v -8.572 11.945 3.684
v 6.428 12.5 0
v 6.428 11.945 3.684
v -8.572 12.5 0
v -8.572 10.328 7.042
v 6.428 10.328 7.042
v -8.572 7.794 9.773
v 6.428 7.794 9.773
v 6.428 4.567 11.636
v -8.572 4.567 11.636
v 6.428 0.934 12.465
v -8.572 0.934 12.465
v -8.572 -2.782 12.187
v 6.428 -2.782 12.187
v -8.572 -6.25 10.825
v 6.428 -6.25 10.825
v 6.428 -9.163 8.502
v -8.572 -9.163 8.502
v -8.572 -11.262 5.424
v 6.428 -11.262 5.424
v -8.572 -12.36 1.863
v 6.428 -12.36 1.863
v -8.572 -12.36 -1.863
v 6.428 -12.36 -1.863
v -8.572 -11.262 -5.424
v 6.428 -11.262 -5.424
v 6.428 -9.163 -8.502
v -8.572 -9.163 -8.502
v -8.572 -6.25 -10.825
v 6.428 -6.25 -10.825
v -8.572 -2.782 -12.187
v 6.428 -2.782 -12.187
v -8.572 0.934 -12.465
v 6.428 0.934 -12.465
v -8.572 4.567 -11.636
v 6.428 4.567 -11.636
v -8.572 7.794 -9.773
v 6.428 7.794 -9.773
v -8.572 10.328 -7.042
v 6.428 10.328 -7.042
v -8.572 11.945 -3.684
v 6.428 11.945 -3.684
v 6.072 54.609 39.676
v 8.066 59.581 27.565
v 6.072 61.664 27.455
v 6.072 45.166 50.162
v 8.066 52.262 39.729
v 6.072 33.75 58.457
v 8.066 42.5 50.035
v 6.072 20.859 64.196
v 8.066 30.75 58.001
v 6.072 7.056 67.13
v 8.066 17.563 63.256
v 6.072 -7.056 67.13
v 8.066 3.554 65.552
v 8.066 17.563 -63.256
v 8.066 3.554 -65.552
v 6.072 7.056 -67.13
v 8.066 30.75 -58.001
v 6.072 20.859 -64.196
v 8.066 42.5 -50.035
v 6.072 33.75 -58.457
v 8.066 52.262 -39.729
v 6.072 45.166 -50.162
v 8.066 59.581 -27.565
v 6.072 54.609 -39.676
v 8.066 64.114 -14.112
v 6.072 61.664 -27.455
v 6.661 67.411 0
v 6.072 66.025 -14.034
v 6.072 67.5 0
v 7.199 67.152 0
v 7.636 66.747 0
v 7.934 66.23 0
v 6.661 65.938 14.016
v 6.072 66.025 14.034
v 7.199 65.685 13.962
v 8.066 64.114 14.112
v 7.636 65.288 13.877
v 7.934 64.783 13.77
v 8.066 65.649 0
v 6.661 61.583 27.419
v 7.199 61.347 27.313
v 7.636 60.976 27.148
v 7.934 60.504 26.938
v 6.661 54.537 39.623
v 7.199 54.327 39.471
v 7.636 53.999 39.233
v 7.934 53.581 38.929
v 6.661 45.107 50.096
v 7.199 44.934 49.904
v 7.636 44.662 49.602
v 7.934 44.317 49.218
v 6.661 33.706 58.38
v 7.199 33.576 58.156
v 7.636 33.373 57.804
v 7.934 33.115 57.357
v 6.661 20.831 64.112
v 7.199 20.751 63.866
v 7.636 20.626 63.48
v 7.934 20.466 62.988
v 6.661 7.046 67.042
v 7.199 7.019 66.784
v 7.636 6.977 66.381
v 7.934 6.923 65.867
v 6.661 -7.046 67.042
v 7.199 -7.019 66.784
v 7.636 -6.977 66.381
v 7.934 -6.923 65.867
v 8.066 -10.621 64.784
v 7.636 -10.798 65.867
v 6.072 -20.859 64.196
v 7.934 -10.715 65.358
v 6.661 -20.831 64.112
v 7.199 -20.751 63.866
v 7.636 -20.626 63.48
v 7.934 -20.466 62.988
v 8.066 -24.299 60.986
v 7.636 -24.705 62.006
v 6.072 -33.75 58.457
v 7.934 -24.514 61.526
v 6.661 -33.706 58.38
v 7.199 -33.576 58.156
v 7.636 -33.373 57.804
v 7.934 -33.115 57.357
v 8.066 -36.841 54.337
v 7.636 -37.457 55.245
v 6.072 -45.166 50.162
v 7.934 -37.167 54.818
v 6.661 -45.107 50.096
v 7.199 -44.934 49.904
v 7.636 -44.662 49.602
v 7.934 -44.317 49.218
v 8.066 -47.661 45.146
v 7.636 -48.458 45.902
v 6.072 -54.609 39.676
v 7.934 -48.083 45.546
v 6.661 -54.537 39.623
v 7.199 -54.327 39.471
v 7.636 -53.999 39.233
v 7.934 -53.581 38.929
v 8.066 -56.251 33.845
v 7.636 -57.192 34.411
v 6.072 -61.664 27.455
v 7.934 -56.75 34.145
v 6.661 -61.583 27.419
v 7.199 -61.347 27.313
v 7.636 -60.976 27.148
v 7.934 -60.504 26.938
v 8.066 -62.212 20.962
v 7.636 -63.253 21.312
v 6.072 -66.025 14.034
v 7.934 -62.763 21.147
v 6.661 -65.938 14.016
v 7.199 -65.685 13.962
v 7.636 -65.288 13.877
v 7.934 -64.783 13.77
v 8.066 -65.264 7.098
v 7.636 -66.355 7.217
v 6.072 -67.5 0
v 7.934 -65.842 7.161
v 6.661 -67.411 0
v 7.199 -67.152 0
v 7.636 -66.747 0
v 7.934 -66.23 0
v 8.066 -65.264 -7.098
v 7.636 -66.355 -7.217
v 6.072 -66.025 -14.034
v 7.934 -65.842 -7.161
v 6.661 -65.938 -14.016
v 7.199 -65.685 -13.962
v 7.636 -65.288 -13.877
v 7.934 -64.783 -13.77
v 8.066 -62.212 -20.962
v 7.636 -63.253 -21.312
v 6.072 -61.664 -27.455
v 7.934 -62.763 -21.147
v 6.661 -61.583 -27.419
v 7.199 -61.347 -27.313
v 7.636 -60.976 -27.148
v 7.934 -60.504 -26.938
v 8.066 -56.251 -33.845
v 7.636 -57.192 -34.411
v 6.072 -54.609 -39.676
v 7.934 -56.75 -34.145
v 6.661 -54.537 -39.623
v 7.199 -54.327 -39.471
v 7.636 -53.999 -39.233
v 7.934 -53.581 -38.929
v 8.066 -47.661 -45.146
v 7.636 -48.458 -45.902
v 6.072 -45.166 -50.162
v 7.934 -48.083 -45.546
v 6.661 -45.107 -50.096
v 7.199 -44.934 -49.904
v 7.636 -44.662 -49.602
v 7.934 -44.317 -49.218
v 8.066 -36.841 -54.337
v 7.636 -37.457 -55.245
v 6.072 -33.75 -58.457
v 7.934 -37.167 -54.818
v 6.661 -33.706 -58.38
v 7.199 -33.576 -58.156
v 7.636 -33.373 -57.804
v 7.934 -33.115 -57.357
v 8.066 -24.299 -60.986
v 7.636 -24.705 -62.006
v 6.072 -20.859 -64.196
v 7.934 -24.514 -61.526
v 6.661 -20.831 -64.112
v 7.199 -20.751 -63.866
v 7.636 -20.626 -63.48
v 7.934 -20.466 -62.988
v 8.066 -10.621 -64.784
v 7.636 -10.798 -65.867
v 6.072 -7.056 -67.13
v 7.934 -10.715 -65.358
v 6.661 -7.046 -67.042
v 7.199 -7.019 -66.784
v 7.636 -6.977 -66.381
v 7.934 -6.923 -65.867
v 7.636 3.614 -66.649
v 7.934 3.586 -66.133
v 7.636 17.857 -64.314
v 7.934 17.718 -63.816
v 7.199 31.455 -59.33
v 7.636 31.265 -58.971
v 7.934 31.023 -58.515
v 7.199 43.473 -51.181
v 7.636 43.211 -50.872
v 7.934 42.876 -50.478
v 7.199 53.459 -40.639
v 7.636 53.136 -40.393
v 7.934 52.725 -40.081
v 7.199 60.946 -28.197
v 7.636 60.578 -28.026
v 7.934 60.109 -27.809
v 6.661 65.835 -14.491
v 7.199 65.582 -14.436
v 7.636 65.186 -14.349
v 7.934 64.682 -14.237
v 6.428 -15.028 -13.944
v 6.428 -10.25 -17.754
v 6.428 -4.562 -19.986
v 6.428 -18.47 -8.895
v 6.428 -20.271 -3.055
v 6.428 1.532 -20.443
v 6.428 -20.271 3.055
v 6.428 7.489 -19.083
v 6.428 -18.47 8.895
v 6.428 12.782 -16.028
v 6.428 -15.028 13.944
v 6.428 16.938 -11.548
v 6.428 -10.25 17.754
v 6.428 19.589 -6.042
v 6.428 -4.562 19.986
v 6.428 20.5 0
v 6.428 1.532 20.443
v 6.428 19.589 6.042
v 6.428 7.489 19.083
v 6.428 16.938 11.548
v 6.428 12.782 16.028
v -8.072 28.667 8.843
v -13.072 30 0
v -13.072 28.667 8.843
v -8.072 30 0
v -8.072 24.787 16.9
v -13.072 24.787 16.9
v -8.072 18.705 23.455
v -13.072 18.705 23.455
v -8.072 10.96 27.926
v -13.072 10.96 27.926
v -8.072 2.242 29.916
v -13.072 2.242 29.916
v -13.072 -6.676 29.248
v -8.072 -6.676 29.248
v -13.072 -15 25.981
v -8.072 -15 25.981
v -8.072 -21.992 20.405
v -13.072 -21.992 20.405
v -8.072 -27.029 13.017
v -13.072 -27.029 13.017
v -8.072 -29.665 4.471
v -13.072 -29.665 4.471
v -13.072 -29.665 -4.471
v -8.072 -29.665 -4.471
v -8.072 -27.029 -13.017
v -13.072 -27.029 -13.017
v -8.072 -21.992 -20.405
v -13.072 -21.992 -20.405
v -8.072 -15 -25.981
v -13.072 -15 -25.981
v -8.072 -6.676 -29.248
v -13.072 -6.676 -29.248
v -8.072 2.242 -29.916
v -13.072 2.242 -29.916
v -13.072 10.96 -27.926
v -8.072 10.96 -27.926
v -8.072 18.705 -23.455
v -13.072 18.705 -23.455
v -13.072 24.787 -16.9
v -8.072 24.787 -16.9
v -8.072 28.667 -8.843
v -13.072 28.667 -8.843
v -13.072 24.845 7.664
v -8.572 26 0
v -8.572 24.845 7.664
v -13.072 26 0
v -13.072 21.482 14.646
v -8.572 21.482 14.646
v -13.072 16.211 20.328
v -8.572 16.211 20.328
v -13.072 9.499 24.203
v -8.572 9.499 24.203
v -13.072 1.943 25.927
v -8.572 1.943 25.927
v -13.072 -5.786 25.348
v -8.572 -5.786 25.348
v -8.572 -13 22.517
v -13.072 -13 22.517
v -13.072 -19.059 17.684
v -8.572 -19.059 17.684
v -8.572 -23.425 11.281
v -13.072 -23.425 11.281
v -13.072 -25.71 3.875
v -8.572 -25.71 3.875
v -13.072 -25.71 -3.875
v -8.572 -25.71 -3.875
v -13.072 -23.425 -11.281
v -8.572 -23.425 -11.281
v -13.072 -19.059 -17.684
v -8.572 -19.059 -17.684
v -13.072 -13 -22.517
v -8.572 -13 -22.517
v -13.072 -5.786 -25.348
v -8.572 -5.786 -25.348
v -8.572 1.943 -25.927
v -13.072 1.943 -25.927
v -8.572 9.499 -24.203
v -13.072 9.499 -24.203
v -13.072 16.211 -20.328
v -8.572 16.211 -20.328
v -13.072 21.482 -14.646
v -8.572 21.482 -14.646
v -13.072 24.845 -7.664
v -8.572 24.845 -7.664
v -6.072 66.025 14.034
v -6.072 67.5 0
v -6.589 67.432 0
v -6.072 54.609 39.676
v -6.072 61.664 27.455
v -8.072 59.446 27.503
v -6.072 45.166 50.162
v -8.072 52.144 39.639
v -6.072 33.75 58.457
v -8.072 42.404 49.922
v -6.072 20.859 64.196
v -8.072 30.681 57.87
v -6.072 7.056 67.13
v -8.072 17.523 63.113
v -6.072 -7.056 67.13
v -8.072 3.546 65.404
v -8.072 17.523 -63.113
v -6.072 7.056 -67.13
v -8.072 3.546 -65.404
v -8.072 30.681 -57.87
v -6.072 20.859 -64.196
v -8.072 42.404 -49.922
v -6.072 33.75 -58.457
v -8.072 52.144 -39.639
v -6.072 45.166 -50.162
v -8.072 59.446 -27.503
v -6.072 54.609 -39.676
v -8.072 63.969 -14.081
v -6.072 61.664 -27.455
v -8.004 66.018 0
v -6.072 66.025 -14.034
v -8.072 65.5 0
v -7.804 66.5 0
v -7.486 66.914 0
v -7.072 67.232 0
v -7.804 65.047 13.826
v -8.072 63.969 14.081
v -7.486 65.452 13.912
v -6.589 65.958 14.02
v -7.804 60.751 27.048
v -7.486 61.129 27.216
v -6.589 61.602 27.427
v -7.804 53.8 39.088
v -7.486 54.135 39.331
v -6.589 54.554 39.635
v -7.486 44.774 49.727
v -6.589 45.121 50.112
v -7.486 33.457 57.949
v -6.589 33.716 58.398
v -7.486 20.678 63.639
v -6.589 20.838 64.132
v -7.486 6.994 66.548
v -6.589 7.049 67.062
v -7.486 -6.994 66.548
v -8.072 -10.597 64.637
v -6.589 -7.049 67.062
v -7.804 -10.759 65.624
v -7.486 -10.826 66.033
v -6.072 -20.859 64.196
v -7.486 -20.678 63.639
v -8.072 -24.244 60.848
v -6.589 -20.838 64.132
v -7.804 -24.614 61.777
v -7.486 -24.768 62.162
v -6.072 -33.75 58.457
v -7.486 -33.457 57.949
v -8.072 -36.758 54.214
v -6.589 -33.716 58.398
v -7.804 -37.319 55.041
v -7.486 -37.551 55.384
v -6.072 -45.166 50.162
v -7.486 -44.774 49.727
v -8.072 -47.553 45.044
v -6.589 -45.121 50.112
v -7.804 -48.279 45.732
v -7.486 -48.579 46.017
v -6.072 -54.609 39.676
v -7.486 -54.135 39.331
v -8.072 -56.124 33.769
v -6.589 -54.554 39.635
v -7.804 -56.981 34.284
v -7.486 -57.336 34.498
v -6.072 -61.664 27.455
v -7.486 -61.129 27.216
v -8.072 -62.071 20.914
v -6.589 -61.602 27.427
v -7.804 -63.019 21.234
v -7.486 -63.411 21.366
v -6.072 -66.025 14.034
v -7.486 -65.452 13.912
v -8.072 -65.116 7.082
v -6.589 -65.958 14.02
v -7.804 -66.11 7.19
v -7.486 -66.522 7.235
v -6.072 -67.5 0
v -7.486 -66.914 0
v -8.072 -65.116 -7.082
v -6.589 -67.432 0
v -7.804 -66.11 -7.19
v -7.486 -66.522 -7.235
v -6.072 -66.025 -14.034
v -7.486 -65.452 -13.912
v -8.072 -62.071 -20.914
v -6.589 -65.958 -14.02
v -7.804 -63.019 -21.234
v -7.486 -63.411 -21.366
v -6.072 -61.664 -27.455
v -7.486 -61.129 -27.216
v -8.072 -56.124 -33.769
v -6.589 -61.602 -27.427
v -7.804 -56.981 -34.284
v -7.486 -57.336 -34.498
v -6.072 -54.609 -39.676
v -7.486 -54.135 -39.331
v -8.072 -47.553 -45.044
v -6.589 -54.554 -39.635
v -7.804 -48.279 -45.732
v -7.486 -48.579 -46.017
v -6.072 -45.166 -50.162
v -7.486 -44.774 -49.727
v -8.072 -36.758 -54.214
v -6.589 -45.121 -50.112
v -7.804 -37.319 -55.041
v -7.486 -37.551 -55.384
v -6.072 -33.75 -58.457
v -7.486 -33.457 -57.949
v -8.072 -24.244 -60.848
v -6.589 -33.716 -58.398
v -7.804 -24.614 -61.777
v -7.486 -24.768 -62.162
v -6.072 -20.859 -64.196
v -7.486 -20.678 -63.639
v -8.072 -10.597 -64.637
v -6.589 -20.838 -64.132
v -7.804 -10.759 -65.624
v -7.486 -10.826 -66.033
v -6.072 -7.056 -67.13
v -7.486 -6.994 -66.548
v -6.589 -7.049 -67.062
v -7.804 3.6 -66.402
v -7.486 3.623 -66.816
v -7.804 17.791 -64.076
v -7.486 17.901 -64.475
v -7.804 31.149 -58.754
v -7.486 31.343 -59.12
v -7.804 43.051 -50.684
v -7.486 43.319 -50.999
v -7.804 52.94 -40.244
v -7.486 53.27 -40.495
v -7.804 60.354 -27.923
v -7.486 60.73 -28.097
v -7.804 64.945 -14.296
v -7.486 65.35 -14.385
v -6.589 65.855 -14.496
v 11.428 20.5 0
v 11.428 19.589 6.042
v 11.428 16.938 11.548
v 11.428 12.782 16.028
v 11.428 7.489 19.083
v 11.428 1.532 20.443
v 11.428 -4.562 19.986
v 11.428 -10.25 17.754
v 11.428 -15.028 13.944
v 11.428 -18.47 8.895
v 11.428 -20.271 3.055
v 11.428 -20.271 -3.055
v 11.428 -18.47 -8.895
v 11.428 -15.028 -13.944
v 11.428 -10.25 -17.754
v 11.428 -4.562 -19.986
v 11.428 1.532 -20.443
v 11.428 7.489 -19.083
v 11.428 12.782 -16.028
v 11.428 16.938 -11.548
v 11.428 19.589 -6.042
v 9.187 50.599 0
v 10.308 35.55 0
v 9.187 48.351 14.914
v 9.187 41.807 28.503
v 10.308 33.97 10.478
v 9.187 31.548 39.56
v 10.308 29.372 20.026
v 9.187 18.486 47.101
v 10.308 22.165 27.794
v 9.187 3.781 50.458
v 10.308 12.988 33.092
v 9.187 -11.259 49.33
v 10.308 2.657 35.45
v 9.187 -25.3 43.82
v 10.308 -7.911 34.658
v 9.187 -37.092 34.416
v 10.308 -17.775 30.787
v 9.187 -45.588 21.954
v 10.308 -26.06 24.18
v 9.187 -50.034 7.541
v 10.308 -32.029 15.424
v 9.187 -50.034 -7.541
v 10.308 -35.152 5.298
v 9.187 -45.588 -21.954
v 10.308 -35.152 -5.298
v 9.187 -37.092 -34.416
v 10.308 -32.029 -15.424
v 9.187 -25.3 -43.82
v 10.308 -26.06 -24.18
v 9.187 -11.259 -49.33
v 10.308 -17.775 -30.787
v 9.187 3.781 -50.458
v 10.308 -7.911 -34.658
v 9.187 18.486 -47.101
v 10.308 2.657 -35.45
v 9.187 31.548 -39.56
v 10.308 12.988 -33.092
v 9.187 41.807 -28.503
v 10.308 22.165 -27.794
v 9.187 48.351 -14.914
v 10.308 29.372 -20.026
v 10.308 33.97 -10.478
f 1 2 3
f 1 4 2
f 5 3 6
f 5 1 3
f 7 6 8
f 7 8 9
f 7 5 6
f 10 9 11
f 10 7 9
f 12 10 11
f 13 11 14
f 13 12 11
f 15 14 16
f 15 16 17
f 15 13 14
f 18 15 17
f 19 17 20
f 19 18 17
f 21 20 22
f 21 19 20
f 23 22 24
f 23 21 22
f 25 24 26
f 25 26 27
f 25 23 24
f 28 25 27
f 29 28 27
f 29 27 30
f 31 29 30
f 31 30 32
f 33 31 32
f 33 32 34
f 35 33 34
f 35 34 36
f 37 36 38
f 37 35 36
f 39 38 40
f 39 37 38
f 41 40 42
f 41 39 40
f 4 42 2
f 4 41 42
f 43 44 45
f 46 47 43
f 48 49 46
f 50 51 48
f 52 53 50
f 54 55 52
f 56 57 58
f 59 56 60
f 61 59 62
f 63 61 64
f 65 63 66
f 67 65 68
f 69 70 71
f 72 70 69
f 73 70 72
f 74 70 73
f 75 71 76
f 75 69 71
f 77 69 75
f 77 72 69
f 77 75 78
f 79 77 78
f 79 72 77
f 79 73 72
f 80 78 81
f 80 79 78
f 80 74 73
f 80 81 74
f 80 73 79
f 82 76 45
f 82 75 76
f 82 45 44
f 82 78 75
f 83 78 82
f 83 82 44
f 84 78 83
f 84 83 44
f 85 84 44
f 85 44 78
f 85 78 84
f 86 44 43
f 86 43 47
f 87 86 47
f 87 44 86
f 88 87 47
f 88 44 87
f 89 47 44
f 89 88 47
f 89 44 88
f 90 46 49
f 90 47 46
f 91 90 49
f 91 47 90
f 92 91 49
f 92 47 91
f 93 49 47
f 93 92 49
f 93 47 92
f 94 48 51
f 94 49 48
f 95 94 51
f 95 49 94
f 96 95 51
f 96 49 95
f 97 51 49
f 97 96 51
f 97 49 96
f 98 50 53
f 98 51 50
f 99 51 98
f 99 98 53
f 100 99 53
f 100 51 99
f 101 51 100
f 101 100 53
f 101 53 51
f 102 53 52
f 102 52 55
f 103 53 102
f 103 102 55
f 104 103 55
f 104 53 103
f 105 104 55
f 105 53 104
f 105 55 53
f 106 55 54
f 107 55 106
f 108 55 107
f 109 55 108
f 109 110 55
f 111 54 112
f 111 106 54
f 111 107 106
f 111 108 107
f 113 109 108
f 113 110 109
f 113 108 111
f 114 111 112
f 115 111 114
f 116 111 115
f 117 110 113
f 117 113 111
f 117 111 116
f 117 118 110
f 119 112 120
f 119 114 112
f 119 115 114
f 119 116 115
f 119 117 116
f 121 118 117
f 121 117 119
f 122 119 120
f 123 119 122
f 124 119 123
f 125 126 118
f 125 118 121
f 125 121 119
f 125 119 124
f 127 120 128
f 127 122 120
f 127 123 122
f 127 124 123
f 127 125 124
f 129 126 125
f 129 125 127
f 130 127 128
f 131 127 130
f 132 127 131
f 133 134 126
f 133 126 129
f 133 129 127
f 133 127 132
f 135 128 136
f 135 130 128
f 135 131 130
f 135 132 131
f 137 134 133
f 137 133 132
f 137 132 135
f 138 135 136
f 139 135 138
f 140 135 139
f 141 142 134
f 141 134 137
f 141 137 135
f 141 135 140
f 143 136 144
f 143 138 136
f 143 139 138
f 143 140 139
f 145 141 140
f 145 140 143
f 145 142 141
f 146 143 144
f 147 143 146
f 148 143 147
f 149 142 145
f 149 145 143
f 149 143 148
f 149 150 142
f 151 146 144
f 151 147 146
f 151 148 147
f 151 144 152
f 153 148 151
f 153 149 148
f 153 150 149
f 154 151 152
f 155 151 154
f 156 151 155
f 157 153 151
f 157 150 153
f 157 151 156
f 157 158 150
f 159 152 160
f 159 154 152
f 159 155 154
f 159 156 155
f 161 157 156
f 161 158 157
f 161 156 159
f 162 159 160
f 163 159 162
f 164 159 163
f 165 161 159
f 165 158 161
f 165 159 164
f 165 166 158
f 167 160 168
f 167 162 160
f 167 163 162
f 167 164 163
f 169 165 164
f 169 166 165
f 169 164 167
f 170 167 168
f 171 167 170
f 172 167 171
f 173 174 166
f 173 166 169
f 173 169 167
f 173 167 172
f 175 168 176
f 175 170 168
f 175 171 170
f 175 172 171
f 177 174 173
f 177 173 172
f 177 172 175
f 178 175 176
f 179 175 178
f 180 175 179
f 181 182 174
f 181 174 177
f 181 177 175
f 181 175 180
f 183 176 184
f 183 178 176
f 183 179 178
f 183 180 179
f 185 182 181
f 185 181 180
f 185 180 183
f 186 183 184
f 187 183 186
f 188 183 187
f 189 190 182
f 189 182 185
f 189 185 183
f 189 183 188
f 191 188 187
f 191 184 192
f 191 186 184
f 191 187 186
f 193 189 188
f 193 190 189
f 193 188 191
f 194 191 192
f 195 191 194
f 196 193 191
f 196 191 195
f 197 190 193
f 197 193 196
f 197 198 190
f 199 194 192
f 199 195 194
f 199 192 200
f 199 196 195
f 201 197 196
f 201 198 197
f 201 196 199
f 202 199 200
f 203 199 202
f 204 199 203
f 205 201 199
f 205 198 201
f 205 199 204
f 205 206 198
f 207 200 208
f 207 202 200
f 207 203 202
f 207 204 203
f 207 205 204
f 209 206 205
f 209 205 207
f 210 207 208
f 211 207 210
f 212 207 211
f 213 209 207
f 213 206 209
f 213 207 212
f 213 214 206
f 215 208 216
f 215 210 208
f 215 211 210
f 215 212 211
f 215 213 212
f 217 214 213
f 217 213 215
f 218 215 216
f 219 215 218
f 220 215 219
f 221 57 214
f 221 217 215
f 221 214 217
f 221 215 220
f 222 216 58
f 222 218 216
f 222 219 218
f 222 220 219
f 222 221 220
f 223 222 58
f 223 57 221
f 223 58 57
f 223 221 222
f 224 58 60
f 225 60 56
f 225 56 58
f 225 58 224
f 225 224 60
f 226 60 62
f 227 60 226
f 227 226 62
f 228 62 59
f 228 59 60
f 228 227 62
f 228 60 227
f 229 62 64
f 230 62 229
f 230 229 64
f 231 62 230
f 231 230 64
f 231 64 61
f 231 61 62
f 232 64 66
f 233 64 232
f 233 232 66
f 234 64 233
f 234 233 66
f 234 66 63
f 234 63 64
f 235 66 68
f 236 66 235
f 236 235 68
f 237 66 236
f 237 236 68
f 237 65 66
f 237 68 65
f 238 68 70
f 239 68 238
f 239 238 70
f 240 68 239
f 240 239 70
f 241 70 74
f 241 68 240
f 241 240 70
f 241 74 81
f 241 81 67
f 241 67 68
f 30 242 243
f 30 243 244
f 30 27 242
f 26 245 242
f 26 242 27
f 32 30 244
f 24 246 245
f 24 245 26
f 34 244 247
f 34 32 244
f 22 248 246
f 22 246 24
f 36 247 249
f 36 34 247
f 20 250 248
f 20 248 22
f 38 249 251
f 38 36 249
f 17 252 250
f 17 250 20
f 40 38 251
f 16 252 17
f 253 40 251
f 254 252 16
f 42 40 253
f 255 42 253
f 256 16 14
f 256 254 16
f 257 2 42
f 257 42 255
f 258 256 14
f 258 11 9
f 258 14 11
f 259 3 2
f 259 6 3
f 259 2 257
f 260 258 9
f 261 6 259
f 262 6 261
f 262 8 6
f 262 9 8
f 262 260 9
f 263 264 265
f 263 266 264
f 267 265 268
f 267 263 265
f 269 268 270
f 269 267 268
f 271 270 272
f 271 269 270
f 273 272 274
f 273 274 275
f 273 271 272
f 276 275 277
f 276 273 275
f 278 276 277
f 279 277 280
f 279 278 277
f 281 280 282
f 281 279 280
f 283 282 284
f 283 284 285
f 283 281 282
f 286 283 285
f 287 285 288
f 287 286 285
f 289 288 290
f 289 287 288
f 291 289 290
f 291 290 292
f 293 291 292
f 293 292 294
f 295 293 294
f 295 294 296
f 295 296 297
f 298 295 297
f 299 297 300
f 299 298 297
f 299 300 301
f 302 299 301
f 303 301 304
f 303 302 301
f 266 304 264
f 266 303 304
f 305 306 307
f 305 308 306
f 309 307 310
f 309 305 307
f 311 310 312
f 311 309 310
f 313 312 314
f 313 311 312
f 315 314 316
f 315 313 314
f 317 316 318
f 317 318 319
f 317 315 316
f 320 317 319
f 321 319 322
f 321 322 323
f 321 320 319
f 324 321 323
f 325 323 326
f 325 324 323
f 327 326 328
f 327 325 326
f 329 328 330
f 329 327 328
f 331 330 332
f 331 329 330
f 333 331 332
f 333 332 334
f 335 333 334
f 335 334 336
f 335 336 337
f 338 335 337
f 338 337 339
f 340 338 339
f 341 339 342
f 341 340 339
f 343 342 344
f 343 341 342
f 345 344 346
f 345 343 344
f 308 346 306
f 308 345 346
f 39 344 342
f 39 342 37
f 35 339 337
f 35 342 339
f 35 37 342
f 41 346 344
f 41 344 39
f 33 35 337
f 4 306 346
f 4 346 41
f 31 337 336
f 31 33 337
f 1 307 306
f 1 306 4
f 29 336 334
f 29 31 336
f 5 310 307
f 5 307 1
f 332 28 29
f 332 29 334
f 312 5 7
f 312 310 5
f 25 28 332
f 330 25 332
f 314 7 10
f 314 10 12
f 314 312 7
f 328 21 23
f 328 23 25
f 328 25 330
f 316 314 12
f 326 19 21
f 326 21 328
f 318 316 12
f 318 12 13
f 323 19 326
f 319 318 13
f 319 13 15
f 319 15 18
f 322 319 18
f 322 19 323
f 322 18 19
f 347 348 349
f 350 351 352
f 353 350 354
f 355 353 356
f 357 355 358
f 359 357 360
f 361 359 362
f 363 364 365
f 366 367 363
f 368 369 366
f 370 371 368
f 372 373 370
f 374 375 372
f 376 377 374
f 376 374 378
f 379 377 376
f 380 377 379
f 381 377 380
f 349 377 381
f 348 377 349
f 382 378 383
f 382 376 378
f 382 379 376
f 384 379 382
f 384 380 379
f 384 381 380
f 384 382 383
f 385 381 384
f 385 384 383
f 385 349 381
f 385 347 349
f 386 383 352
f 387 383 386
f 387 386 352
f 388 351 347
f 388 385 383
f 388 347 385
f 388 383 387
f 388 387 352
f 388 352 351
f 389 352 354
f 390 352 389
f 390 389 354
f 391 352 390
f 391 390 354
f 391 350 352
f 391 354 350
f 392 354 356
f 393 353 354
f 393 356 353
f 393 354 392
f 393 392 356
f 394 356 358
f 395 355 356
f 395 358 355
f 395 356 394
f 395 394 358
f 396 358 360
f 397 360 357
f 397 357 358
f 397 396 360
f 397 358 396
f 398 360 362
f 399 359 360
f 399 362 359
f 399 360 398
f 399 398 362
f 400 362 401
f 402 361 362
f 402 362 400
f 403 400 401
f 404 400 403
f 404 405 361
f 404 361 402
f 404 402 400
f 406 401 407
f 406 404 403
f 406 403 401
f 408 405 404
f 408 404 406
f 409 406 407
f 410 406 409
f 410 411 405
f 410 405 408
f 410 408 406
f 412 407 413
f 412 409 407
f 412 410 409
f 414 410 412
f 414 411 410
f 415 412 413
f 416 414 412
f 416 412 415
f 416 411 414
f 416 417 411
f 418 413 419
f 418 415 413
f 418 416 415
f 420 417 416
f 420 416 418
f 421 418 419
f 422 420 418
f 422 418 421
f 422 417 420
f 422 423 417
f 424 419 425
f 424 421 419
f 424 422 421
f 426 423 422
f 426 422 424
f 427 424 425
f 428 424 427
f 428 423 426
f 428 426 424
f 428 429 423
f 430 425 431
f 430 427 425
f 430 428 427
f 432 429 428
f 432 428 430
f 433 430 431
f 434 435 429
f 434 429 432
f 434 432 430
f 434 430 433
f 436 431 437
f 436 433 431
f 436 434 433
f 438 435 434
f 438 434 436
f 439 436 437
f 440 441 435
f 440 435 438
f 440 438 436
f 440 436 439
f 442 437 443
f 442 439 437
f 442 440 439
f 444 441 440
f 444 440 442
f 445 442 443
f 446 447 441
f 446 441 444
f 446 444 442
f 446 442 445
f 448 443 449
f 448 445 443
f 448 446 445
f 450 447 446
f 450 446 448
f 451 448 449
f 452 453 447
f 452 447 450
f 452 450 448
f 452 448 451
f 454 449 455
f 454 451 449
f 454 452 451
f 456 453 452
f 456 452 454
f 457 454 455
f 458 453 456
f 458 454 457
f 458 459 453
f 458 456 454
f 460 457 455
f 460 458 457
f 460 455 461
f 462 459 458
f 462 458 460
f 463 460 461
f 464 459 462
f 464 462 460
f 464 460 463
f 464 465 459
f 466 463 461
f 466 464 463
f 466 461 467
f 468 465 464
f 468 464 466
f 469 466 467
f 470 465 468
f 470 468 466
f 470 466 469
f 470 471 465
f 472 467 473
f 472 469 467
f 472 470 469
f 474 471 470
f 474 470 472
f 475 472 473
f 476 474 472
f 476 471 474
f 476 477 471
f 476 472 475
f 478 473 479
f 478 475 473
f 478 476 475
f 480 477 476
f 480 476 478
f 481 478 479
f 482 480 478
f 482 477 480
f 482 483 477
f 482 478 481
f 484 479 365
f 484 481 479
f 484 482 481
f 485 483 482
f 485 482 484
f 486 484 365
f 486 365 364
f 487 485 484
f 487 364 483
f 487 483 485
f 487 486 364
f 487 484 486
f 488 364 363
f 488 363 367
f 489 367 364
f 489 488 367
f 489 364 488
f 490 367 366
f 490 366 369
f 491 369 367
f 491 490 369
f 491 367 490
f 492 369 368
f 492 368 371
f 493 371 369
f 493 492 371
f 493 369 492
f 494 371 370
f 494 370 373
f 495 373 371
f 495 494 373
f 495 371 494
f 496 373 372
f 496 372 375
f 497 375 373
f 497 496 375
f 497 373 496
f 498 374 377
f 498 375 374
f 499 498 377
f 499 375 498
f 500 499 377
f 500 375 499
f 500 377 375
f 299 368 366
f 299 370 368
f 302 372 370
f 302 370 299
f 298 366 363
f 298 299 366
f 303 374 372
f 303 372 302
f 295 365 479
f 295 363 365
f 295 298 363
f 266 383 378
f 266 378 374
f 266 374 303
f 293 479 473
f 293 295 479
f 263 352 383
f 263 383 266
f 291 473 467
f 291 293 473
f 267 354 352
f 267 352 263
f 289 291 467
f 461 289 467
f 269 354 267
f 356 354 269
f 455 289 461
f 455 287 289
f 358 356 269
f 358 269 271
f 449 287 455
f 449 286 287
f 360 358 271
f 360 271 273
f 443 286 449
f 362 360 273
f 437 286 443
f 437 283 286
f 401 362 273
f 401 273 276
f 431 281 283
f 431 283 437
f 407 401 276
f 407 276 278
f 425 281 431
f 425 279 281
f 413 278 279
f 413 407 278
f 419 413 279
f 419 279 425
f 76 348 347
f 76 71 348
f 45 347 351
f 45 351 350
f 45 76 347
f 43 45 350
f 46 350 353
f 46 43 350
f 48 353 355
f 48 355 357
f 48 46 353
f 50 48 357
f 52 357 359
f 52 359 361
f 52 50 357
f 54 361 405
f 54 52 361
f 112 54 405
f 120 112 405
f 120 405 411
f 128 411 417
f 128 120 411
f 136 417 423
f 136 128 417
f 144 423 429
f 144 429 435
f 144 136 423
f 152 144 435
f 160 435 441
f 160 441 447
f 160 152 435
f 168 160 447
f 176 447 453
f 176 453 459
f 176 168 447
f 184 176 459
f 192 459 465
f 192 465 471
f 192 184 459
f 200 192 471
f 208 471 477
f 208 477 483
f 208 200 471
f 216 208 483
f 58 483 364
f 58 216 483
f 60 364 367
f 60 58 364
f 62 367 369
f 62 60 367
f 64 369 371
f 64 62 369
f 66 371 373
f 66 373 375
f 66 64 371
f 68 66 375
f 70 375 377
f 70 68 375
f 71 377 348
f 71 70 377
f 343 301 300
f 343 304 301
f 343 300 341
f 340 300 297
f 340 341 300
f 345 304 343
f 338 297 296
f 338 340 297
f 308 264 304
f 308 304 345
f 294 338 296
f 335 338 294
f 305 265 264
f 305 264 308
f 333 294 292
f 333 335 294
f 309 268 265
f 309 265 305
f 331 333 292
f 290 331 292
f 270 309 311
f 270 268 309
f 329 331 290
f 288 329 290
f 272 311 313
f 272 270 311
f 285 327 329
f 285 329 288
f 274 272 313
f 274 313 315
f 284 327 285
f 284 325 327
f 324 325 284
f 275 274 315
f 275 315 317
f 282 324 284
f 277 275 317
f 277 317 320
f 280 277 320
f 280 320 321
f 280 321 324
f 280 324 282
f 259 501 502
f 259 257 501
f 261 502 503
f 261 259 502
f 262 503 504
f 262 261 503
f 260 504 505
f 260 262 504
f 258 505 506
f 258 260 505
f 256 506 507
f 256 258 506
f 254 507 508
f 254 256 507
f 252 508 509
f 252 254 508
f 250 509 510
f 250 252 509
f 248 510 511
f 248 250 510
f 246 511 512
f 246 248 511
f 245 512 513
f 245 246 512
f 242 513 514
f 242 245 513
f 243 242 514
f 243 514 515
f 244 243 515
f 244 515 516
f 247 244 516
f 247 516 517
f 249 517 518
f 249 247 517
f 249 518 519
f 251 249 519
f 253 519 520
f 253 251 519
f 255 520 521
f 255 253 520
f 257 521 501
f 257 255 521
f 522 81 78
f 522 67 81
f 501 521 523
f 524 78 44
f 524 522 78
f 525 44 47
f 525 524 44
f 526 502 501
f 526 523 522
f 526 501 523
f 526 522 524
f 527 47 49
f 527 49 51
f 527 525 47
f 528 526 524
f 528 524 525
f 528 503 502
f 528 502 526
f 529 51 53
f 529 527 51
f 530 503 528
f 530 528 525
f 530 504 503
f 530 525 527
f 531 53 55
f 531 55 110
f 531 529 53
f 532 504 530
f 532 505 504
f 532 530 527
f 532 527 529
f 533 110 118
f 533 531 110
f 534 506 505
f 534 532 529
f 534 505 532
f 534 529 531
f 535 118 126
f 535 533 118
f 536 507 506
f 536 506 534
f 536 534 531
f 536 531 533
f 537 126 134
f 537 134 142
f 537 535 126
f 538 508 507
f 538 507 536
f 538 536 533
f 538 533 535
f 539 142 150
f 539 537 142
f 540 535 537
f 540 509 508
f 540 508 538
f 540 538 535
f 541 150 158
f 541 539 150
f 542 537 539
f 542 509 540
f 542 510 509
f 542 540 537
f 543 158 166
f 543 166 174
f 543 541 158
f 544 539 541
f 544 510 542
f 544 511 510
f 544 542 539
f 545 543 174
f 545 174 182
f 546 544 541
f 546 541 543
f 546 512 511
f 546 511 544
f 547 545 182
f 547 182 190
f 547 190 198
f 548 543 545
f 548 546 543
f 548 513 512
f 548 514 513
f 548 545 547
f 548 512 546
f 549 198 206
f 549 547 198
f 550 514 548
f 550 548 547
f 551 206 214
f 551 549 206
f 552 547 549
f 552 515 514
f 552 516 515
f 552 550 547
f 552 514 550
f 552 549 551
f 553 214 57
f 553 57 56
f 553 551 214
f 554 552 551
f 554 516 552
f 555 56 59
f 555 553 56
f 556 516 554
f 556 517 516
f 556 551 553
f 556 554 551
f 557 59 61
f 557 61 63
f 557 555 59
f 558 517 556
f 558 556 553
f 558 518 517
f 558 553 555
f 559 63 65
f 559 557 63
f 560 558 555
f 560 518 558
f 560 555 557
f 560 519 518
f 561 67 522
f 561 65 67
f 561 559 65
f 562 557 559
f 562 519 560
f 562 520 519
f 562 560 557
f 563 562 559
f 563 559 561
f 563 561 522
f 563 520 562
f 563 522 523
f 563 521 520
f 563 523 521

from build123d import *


with BuildPart() as part:
    # Эскиз1 → Повернуть1 (revolve)
    with BuildSketch(Plane.XY):
        with BuildLine():
            Line((6.428300829, 12.5), (-8.571699171, 12.5))
            Line((-8.571699171, 12.5), (-8.571699171, 26))
            Line((-8.571699171, 26), (-13.071699171, 26))
            Line((-13.071699171, 26), (-13.071699171, 30))
            Line((-13.071699171, 30), (-8.071699171, 30))
            Line((-8.071699171, 30), (-8.071699171, 65.5))
            ThreePointArc((-8.071699171, 65.5), (-7.485912733, 66.914213562), (-6.071699171, 67.5))
            Line((-6.071699171, 67.5), (6.071699171, 67.5))
            ThreePointArc((6.071699171, 67.5), (7.432388365, 66.965784745), (8.066176633, 65.648524917))
            Line((8.066176633, 65.648524917), (11.428300829, 20.5))
            Line((11.428300829, 20.5), (6.428300829, 20.5))
            Line((6.428300829, 20.5), (6.428300829, 12.5))
        make_face()
    revolve(axis=Axis((-643.332684128, 0, 0), (1, 0, 0)))


solid = part.part
